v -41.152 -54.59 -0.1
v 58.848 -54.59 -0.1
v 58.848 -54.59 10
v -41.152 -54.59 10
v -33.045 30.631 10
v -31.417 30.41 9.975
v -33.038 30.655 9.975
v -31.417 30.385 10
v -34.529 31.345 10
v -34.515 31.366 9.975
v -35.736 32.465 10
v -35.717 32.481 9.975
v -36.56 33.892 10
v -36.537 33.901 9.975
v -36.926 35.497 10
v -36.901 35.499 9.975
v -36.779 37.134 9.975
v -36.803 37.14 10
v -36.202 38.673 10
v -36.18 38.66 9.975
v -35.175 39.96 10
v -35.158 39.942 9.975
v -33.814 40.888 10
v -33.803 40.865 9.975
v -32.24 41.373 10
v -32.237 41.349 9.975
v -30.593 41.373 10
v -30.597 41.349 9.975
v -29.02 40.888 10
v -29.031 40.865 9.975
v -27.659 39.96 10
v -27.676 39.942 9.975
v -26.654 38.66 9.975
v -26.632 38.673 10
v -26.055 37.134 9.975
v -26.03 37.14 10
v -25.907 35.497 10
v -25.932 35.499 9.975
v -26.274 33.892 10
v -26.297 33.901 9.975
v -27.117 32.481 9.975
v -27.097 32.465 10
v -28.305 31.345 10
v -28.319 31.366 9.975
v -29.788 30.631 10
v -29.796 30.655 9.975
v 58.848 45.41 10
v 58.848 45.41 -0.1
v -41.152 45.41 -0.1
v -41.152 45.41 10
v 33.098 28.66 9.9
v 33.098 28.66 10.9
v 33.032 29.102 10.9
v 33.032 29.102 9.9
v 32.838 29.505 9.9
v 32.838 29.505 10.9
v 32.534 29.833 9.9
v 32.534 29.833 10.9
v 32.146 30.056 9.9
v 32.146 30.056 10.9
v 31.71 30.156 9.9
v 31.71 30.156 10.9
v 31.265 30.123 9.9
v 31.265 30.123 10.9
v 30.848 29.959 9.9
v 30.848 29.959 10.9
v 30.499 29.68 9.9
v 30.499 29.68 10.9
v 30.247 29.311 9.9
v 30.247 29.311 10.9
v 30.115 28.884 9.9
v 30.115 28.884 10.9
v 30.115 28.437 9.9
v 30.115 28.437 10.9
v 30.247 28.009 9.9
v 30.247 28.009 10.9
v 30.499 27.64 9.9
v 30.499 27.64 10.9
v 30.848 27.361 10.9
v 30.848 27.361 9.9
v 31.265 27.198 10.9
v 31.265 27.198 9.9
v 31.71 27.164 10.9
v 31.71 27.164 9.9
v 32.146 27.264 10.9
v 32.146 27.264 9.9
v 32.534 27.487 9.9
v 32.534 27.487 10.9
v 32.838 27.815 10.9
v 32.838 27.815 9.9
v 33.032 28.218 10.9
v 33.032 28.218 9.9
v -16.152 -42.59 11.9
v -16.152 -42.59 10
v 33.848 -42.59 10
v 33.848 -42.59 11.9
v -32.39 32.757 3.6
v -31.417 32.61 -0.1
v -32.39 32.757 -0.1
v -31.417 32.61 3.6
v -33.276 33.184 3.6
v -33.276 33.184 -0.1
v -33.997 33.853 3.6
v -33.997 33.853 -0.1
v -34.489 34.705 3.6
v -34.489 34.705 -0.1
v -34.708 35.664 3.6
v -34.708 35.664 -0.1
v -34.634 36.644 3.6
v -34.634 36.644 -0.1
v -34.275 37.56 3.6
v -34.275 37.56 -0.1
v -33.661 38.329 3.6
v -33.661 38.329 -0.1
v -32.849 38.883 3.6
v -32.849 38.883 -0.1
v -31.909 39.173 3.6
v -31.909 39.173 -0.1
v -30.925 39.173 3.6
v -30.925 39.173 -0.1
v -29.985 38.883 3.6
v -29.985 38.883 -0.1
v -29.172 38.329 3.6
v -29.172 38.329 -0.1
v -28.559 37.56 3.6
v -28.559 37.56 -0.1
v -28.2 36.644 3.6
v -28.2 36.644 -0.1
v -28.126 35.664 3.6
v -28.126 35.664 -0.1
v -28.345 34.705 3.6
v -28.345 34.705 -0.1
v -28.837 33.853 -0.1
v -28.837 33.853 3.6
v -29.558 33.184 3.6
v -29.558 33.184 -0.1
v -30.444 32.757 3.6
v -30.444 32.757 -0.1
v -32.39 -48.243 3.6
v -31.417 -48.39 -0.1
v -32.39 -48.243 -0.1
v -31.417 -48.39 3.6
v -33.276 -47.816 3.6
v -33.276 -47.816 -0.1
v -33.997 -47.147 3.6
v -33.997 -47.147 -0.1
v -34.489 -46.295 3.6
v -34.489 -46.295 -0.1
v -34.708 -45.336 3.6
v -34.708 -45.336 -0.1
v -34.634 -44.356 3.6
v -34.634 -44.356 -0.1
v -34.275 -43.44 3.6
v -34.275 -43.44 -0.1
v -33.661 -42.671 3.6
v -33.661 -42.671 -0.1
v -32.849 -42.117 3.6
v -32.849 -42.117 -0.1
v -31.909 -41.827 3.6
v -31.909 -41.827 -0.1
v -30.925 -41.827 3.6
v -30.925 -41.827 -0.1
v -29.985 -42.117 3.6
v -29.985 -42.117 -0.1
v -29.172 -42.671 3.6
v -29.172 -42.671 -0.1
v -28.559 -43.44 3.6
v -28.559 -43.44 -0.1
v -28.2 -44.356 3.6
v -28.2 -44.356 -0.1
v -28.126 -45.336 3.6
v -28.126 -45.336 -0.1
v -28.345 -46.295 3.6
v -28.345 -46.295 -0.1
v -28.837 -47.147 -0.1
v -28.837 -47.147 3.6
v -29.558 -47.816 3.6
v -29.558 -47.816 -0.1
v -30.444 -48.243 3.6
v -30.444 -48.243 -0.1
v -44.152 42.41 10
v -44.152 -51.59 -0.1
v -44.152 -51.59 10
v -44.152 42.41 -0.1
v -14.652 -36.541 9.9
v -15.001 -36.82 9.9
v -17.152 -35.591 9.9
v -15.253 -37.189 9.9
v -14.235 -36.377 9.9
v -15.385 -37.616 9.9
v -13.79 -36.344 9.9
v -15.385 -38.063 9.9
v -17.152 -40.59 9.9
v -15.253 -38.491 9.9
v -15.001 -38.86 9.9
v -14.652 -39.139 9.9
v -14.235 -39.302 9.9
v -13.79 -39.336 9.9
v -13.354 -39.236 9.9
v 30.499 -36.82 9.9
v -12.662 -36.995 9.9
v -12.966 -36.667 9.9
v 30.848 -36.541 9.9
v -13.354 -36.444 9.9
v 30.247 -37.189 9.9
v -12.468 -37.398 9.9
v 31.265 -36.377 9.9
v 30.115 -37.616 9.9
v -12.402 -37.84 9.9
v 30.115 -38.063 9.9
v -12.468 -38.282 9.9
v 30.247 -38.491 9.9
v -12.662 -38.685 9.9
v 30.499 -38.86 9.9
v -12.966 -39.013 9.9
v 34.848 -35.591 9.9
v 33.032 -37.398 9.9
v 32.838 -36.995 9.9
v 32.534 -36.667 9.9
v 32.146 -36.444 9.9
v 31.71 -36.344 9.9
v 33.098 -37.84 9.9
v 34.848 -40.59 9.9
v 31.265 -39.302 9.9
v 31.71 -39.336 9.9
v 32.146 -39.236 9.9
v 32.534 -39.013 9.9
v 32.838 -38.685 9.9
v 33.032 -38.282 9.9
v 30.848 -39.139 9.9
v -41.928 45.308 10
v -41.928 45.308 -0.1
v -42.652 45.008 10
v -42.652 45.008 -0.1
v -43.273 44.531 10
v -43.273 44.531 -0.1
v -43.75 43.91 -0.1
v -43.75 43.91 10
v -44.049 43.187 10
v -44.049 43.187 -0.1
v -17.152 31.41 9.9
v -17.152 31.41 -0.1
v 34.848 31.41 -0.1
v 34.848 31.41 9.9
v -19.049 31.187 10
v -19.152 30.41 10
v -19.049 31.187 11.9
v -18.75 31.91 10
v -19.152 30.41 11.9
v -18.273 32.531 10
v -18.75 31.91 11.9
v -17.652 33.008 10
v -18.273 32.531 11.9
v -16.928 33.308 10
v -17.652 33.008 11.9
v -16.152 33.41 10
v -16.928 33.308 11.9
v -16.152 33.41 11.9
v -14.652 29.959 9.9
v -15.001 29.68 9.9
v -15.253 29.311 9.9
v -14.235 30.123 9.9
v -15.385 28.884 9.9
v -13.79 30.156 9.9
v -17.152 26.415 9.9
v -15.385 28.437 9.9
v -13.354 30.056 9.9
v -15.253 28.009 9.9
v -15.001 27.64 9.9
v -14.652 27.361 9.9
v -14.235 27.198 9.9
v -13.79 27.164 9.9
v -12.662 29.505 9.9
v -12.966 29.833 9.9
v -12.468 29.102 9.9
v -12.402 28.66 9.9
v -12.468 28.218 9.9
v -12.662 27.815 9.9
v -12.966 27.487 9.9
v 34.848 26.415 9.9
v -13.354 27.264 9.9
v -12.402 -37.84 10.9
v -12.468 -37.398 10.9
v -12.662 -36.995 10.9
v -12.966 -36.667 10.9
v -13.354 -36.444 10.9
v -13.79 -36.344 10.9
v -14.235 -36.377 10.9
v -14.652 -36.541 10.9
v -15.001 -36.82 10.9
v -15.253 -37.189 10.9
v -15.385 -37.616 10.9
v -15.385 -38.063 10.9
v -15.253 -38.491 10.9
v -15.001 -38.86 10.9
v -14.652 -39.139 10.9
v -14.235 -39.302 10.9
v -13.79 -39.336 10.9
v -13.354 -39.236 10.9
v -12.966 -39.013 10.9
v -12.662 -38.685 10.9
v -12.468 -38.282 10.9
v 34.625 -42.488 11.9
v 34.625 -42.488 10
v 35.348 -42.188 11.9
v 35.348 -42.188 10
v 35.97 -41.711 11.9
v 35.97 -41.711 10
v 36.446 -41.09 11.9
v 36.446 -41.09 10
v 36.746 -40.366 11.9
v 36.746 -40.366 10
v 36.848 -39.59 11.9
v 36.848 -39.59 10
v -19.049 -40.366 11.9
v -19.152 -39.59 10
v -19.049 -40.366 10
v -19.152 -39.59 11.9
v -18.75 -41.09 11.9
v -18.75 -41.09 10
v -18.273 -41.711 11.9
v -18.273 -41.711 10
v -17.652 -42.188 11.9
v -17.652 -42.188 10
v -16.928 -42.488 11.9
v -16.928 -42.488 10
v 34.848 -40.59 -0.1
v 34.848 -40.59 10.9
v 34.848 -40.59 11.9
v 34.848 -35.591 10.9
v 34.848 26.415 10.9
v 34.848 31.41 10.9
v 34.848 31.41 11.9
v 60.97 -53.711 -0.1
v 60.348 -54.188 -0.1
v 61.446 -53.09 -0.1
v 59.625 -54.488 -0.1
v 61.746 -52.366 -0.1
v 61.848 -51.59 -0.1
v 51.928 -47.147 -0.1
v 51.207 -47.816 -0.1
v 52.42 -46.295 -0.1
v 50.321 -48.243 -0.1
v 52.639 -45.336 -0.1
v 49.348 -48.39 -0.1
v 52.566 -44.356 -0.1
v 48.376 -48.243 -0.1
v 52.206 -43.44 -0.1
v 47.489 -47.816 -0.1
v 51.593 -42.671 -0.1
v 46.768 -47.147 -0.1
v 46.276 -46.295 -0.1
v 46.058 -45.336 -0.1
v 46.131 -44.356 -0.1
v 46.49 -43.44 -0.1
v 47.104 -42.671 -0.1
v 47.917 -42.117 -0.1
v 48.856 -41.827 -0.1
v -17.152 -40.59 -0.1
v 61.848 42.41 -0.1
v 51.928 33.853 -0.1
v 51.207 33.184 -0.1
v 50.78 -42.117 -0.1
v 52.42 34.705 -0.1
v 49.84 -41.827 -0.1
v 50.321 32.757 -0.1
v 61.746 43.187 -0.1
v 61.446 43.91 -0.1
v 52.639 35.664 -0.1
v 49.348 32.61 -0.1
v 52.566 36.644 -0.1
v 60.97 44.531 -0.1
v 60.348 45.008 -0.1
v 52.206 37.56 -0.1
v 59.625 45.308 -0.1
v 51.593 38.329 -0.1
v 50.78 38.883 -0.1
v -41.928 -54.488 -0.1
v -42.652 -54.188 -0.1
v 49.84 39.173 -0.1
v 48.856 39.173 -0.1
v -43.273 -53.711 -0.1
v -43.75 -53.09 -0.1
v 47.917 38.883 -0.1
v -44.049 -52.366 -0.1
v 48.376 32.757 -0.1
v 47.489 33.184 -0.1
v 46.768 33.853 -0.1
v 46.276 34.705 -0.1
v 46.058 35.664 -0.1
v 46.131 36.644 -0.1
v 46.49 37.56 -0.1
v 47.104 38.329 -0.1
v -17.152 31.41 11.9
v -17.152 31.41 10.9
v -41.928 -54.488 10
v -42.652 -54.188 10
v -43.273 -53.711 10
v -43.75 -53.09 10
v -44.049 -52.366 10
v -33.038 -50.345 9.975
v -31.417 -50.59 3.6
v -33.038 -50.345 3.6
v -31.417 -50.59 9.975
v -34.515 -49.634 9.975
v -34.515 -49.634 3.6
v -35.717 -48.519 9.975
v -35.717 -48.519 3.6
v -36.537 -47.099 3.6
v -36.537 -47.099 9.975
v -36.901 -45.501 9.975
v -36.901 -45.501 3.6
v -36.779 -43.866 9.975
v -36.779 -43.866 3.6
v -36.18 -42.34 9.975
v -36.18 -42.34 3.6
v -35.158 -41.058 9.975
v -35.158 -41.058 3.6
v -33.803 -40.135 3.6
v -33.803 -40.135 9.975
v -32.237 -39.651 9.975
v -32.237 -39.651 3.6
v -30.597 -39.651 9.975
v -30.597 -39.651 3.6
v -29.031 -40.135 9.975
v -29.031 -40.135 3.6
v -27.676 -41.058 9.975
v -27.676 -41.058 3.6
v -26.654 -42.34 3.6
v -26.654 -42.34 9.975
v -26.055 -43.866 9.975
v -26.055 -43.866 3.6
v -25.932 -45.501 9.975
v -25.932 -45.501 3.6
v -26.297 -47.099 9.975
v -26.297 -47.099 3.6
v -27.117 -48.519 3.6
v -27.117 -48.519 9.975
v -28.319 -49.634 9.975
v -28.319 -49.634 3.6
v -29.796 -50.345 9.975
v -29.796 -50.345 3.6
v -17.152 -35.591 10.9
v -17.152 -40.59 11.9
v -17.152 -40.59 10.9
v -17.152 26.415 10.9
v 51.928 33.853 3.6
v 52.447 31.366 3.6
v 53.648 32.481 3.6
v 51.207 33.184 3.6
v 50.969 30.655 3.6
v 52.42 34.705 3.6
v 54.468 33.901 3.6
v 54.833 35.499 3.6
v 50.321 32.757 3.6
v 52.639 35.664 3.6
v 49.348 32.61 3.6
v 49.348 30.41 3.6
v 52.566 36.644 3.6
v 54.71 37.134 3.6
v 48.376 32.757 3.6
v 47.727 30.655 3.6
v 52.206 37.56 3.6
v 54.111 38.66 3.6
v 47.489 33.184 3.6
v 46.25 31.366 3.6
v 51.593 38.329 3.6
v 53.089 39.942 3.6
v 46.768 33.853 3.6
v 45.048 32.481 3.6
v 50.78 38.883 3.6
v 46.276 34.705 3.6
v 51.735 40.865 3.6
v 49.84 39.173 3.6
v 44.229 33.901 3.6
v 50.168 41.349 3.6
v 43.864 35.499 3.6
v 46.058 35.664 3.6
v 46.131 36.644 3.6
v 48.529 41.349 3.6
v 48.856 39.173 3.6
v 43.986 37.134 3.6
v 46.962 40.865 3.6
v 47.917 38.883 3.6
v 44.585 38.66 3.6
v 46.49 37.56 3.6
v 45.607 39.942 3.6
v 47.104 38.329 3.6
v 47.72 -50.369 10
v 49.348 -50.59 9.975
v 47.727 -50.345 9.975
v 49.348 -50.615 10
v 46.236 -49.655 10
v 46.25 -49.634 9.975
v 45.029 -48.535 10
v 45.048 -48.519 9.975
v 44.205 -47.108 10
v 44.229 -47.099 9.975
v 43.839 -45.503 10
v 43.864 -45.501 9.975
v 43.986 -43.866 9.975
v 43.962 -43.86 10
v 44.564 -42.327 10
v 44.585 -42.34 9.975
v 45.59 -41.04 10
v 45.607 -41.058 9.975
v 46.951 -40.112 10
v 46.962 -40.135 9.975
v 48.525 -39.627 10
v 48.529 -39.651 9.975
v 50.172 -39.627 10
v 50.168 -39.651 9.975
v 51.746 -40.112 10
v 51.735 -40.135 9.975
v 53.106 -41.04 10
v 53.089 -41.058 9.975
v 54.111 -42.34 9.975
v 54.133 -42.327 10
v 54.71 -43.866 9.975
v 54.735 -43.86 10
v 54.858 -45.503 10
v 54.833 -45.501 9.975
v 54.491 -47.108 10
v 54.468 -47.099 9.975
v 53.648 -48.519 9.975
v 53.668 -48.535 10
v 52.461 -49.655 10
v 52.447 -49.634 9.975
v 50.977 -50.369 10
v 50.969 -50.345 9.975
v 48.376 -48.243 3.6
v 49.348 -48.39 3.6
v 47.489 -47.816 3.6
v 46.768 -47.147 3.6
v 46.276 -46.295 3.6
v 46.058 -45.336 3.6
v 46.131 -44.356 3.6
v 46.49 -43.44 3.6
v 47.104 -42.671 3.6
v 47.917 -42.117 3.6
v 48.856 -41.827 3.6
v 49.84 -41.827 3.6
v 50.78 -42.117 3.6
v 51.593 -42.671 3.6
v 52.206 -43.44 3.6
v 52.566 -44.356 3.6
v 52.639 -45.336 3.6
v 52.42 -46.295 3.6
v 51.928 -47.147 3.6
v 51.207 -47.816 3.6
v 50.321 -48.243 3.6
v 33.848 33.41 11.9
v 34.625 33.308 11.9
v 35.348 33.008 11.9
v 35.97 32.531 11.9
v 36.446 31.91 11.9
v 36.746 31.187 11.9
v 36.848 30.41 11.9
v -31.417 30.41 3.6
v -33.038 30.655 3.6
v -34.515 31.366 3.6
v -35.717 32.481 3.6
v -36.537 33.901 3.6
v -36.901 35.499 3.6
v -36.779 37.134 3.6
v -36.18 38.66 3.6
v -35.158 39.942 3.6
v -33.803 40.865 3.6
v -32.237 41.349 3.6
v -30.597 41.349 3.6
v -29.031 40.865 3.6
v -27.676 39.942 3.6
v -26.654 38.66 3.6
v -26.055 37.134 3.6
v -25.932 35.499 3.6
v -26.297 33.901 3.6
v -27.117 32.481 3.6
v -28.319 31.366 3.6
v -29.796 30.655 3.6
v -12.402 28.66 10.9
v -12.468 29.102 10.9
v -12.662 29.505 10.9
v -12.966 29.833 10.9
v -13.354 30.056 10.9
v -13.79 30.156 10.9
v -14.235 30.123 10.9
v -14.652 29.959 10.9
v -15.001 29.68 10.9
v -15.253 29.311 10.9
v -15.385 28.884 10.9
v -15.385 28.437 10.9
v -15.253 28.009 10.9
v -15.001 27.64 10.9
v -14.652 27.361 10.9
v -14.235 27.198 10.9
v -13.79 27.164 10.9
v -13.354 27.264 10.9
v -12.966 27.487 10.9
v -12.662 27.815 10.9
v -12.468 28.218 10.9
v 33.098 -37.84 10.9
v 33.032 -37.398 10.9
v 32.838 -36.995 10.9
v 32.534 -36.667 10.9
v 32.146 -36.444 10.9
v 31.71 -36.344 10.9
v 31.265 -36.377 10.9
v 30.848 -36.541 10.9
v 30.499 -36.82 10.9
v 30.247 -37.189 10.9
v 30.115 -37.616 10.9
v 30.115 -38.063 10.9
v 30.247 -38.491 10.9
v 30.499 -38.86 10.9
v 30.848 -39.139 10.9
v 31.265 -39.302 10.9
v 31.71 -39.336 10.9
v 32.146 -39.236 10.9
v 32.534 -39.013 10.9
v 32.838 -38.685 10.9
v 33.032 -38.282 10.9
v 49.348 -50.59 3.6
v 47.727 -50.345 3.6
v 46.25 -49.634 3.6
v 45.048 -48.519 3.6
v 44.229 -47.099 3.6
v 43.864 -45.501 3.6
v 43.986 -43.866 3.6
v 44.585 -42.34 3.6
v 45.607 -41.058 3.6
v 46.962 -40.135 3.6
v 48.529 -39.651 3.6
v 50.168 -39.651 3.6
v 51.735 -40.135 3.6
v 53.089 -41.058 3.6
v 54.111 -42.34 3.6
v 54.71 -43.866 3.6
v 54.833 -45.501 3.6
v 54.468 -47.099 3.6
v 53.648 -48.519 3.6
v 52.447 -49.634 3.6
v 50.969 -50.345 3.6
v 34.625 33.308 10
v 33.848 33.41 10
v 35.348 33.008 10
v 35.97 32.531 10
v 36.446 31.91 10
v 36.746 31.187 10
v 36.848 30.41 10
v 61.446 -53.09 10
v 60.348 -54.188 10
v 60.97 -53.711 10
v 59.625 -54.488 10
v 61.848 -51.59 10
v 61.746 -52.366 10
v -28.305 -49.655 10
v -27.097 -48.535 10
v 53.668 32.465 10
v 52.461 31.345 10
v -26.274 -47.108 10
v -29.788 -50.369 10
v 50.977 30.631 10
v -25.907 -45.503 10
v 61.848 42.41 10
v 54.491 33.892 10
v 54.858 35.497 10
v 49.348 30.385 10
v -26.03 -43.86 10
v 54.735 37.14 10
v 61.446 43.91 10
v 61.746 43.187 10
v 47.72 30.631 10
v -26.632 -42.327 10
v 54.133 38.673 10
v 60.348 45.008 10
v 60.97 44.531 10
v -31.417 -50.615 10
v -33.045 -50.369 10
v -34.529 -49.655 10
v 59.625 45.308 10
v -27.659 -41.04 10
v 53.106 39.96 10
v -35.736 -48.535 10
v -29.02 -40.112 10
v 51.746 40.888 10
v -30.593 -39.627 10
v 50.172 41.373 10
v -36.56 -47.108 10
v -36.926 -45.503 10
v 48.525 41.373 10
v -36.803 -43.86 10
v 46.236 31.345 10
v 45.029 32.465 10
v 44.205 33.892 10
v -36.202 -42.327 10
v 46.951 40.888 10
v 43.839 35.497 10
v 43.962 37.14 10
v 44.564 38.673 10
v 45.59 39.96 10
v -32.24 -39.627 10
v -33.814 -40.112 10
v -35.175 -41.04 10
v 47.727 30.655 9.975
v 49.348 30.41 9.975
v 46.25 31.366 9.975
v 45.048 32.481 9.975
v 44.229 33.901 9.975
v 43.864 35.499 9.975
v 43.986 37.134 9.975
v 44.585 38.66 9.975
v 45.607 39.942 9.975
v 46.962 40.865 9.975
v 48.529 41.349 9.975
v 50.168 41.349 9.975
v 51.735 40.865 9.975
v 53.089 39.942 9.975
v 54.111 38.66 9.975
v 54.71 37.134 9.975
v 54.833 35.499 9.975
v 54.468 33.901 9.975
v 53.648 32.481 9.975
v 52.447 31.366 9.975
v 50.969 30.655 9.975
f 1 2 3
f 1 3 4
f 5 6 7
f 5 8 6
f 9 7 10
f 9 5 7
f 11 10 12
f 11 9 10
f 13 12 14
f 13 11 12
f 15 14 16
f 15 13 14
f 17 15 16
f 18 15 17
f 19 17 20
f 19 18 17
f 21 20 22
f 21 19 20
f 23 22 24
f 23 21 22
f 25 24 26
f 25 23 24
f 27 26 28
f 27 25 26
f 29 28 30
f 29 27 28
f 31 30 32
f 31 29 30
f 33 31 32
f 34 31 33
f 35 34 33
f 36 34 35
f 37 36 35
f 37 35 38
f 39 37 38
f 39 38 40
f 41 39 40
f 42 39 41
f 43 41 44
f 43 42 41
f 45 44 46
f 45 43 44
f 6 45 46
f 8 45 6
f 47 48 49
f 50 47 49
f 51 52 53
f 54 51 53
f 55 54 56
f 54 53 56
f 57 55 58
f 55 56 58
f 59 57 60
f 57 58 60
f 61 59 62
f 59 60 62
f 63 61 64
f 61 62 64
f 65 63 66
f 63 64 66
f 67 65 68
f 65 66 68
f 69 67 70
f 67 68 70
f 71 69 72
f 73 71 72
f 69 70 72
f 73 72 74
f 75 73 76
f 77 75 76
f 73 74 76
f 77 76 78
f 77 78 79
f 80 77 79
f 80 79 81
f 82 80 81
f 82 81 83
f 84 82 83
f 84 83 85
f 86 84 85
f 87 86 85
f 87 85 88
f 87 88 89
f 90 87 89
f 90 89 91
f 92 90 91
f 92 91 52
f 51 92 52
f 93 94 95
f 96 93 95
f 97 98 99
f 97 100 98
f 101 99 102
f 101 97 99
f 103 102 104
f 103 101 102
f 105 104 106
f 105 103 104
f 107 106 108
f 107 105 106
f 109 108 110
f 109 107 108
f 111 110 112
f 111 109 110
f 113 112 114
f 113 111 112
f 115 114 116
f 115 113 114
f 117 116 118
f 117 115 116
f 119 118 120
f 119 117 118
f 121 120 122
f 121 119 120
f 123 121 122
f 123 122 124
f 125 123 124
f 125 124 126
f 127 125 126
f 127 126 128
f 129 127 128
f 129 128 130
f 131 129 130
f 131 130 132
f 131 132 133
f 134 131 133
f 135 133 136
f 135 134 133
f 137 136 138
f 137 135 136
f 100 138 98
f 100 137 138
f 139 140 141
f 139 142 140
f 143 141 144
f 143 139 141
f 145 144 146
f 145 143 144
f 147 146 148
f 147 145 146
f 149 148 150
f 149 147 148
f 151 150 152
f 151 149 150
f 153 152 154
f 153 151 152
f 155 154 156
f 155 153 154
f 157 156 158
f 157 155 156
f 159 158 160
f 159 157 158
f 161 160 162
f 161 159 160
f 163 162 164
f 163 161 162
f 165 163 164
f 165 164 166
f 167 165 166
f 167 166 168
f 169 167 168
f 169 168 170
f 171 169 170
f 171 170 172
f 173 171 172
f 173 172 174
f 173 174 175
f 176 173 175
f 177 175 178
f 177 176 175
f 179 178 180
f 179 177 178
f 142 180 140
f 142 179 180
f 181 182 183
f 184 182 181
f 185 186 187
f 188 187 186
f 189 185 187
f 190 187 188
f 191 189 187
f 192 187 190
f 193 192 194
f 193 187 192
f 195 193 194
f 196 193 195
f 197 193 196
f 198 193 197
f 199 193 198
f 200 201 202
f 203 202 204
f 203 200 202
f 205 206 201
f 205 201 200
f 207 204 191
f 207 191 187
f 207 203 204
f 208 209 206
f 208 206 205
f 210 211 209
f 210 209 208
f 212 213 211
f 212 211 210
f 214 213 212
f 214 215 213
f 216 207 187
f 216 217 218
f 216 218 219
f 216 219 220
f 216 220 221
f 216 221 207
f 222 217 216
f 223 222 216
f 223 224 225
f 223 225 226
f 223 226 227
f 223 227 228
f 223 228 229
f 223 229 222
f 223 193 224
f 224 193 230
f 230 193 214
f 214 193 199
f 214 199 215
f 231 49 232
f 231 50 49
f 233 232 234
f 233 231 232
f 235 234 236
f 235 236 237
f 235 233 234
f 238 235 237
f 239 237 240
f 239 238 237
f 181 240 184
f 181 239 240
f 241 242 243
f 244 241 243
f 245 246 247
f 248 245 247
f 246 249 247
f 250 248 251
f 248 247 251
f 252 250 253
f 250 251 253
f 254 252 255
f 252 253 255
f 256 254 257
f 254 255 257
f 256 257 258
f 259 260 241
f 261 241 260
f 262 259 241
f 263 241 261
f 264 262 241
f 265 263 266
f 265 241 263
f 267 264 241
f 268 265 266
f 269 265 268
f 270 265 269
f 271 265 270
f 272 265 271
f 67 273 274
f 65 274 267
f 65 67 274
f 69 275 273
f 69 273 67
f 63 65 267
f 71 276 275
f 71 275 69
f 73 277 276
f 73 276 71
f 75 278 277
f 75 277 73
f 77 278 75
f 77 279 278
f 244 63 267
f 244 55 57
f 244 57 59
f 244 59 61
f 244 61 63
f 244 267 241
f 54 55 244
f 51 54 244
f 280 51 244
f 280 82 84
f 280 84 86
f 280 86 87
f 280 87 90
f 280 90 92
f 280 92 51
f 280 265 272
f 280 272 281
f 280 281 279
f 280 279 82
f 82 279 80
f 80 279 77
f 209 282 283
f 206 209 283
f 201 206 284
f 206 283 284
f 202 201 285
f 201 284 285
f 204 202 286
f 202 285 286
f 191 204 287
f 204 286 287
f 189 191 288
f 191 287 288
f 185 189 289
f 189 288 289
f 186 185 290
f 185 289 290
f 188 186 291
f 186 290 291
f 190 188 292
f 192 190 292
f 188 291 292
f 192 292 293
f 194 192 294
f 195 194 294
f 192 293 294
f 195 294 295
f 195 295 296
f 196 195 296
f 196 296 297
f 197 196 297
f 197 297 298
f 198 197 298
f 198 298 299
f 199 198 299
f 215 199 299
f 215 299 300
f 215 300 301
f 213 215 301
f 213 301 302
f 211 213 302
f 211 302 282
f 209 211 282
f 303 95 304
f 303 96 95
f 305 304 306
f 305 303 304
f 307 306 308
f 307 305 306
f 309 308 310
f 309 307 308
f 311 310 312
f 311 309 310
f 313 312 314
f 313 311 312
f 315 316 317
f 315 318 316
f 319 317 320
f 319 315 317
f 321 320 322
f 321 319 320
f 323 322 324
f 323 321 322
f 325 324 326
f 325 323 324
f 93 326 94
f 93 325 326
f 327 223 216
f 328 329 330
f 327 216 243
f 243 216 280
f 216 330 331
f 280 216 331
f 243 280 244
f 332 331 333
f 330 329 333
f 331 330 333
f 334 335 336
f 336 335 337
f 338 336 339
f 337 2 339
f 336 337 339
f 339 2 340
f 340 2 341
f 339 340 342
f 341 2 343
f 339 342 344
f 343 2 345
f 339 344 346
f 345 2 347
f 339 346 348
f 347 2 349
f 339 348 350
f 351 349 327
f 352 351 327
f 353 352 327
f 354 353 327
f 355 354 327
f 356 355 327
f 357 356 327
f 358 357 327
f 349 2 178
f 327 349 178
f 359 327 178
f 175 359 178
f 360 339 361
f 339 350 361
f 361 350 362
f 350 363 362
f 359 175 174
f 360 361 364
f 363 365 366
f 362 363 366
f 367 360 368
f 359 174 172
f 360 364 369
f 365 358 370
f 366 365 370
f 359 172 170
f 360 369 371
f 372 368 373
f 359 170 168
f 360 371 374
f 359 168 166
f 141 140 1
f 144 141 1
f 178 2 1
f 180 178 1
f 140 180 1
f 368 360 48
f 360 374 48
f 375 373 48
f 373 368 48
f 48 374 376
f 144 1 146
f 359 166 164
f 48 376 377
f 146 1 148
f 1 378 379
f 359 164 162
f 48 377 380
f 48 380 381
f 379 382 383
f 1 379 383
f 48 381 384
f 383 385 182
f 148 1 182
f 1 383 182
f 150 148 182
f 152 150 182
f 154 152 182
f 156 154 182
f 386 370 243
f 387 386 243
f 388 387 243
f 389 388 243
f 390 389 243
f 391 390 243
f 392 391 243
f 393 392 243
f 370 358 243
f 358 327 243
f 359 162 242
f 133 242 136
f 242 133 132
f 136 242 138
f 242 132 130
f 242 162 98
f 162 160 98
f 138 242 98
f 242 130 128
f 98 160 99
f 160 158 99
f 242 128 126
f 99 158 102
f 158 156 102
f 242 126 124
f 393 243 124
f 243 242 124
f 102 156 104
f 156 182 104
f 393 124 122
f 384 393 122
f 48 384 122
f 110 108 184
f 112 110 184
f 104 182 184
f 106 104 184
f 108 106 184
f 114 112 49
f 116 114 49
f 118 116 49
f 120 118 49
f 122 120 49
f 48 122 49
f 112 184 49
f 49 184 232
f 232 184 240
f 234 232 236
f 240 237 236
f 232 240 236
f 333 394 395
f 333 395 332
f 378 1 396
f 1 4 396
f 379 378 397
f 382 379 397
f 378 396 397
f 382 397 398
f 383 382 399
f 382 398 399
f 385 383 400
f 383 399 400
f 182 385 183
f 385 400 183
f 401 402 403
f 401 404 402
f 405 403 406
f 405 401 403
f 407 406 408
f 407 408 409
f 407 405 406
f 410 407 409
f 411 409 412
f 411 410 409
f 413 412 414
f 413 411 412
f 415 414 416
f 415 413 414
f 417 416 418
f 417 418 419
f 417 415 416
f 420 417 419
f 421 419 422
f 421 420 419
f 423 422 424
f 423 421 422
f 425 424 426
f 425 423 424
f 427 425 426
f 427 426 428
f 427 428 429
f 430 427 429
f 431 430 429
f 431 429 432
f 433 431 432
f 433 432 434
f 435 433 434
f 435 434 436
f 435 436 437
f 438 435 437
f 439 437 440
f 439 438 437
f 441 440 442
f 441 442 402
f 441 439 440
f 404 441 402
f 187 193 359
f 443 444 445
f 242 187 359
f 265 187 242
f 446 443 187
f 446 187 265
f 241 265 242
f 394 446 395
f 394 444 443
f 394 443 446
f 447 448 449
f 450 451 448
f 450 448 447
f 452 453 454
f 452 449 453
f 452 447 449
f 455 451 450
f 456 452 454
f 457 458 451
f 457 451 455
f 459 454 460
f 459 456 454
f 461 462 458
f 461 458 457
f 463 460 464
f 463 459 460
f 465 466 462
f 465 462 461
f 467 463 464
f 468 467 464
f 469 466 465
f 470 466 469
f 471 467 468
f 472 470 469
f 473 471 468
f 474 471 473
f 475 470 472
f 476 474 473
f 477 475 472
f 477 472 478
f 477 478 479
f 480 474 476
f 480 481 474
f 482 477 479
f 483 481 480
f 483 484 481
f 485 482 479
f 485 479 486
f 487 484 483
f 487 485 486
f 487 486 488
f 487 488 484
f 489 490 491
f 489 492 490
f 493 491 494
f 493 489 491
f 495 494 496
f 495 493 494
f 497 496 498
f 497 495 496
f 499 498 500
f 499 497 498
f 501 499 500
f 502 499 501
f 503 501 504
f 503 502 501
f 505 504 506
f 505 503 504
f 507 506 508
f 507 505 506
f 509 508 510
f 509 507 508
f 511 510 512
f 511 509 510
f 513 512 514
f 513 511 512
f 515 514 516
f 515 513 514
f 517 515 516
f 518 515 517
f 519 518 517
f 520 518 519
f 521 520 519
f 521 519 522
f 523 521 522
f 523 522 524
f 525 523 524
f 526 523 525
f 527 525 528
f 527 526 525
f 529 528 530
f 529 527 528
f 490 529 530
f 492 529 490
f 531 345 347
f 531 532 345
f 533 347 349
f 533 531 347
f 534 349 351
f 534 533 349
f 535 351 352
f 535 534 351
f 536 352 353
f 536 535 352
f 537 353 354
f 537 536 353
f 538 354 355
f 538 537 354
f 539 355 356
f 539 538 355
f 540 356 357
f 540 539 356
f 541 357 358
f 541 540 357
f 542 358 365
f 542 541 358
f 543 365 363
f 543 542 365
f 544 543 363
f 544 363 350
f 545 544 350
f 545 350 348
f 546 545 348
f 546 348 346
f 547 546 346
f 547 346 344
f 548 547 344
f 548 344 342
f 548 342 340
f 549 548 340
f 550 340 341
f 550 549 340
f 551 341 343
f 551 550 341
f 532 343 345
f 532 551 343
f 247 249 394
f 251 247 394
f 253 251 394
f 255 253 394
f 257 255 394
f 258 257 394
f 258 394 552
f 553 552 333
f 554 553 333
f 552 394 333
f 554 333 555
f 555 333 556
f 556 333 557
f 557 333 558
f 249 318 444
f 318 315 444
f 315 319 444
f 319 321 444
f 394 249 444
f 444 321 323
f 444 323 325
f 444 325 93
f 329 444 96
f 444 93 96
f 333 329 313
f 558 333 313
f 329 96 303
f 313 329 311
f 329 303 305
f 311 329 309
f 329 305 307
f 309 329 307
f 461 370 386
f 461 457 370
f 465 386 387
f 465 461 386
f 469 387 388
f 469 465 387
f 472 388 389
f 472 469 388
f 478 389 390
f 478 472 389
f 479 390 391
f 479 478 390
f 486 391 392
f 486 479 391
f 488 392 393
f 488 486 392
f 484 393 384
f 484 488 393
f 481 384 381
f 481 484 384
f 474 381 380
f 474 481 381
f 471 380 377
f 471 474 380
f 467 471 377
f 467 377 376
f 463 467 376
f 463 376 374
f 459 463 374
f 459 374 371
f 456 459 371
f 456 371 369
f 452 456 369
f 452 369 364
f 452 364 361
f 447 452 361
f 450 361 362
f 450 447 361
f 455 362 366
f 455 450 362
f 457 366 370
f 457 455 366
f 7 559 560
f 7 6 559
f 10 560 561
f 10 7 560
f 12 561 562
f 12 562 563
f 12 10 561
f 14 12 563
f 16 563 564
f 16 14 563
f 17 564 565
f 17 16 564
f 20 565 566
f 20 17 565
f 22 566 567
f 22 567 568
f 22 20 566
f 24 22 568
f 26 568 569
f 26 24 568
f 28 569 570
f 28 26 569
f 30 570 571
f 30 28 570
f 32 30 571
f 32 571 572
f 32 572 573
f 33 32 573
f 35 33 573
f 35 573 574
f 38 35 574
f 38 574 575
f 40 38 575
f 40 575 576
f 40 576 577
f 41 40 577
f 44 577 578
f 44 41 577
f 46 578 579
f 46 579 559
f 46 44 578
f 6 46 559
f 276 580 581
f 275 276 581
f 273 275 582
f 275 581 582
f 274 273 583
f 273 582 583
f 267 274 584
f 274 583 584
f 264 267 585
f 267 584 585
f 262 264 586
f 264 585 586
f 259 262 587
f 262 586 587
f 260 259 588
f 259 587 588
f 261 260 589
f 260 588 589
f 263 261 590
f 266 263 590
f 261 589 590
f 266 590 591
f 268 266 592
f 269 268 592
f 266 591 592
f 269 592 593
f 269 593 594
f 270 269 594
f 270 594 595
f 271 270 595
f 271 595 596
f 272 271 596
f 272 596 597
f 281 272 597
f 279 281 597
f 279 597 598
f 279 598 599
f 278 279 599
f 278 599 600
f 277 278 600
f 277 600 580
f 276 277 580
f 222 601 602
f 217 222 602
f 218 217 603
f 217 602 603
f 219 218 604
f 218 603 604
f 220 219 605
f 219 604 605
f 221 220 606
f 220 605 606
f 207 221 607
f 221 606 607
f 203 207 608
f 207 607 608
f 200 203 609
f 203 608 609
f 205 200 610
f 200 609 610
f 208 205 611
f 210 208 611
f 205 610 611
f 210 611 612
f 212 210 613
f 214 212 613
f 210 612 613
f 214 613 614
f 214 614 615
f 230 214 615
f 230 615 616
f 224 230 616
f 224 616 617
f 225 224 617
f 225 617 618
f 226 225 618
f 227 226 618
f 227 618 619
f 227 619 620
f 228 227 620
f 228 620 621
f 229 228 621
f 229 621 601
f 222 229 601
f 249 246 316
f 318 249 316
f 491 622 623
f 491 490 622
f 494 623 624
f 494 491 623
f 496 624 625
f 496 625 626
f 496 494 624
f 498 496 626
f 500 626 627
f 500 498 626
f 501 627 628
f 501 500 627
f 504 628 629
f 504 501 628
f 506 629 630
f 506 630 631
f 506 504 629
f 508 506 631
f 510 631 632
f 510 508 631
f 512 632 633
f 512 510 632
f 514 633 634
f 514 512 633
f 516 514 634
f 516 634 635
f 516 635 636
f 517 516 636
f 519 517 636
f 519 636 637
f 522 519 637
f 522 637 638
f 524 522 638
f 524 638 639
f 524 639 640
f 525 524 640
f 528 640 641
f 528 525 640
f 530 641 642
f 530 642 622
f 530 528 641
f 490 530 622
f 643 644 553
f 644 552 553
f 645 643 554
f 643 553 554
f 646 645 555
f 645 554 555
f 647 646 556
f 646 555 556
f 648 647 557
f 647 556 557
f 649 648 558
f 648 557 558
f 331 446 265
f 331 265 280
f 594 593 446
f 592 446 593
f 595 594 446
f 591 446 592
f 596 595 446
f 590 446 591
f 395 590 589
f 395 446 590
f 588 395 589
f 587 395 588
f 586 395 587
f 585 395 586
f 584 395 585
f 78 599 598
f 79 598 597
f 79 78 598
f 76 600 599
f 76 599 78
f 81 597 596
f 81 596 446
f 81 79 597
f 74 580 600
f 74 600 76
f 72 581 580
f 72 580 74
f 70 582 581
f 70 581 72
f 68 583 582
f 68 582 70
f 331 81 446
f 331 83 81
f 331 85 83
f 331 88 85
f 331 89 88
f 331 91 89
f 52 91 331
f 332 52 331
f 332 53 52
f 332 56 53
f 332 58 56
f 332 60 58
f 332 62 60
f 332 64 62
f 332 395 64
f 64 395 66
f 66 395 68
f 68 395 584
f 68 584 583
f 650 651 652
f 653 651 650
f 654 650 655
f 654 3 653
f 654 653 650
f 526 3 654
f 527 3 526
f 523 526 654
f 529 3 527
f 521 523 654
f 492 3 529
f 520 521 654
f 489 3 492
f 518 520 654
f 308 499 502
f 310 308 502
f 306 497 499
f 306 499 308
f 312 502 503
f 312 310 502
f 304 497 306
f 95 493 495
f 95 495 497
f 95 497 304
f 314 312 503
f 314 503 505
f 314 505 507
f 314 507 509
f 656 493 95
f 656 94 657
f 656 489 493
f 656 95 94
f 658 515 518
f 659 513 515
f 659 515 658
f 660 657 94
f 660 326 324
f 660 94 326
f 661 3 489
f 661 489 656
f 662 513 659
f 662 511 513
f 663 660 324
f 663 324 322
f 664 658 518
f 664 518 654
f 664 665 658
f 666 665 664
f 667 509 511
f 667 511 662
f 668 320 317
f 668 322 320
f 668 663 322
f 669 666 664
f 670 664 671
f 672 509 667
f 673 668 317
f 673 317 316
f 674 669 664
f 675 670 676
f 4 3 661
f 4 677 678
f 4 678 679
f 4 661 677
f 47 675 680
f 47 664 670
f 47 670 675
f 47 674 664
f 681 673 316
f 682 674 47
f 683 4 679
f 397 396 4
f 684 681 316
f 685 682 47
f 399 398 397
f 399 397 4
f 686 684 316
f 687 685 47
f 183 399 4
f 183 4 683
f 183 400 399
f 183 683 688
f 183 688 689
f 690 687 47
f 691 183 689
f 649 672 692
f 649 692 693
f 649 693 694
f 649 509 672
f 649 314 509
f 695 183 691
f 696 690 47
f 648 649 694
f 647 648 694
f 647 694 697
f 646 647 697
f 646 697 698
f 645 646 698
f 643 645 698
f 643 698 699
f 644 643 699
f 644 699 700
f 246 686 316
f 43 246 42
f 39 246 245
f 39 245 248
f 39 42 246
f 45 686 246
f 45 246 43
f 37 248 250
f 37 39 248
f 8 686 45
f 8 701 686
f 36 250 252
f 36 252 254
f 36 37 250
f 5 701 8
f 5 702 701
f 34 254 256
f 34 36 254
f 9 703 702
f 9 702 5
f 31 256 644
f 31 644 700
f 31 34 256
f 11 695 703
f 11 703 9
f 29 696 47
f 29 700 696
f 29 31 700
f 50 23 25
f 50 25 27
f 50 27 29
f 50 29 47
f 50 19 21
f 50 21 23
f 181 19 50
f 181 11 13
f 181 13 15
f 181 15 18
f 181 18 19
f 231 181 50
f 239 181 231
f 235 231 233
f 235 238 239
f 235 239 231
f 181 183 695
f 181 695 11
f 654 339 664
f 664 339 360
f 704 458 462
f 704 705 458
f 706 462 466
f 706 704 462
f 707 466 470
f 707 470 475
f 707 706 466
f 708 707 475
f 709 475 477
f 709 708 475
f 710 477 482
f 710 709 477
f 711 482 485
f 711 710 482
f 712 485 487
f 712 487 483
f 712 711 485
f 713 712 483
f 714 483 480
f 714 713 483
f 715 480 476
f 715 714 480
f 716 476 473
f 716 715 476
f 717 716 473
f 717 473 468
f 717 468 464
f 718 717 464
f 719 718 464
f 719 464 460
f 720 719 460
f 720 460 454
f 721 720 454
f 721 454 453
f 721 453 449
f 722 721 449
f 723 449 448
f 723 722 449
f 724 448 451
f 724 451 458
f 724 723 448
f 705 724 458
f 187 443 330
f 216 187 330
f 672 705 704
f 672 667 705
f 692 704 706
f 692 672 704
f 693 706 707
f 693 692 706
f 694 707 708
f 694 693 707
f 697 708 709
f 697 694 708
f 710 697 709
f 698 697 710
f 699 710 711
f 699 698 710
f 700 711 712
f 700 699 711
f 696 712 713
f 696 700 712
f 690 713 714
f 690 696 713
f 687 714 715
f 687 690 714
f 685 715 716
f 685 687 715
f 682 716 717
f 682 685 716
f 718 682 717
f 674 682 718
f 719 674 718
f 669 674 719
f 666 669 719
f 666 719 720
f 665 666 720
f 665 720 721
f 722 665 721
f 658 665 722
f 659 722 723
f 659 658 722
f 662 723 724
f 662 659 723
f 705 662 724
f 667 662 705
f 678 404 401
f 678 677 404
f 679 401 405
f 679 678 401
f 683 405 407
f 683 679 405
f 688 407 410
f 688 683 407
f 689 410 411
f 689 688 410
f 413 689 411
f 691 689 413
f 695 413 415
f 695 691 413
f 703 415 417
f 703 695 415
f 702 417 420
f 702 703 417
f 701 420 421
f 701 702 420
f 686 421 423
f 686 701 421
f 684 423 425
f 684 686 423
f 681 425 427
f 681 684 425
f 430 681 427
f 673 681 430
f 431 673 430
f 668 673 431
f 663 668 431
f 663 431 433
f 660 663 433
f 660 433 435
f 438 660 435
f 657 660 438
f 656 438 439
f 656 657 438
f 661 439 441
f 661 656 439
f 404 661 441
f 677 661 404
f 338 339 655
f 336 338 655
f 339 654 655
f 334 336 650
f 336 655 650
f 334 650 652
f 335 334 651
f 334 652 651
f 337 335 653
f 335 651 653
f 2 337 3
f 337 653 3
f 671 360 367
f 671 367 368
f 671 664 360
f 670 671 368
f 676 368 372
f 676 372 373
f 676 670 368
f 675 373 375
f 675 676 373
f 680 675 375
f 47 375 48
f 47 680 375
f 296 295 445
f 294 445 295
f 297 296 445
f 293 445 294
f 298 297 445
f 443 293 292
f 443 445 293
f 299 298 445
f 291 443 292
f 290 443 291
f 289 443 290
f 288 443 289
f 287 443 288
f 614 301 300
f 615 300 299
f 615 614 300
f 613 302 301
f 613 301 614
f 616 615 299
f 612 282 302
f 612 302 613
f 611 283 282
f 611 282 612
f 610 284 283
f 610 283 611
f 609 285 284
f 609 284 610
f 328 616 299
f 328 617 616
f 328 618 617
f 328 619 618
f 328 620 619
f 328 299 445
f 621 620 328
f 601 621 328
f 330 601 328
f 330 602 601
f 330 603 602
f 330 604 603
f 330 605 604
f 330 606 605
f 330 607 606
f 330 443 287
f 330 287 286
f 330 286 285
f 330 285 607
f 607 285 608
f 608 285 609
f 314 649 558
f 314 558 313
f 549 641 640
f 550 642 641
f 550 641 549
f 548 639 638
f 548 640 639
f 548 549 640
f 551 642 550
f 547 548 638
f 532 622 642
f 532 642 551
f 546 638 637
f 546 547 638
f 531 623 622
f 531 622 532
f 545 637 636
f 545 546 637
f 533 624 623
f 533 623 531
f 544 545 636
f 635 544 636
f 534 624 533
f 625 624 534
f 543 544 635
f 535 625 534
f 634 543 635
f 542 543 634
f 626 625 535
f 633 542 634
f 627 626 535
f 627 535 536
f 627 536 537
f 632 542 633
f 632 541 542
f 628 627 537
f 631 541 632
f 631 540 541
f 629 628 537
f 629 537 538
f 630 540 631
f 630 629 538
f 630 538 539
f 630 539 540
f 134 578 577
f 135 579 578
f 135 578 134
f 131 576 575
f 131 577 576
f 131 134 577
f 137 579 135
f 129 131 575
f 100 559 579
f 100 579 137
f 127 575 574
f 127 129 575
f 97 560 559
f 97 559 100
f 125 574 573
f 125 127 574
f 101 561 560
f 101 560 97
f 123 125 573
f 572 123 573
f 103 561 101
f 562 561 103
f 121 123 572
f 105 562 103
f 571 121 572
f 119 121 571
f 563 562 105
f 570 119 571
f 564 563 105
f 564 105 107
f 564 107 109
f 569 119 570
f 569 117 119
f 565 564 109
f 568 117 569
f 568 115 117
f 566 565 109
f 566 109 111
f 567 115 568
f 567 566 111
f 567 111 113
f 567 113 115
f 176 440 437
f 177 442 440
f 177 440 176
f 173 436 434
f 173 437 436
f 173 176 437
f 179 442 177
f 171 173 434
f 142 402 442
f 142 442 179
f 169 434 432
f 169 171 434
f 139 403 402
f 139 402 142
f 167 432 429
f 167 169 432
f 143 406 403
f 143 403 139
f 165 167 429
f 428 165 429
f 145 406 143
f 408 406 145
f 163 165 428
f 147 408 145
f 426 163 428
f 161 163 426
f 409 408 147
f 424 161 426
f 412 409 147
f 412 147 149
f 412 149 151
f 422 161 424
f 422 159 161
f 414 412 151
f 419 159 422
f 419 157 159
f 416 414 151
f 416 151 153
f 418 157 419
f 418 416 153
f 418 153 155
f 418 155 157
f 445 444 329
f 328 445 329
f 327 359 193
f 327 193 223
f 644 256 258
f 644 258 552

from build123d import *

# Parameters (mm, degrees)
BOSS_EXTRUDE3_DEPTH                          = 10
BOSS_EXTRUDE3_DEPTH_BACK                     = 0.1
SKETCH1_W                                    = 100
SKETCH1_H                                    = 106
SKETCH1_W_2                                  = 76
SKETCH1_H_2                                  = 56
CBORE_FOR_M6_HEX_SOCKET_HEAD_CAP_SCR_2_COUNT = 2
CBORE_FOR_M6_HEX_SOCKET_HEAD_CAP_SCR_2_PITCH = 81
CBORE_FOR_M6_HEX_SOCKET_HEAD_CAP_SCR_3_COUNT = 2
CBORE_FOR_M6_HEX_SOCKET_HEAD_CAP_SCR_3_PITCH = 114.385386776
CBORE_FOR_M6_HEX_SOCKET_HEAD_CAP_SCR_4_COUNT = 2
CBORE_FOR_M6_HEX_SOCKET_HEAD_CAP_SCR_4_PITCH = 80.765194904
SKETCH7_W                                    = 56
SKETCH7_H                                    = 76
BOSS_EXTRUDE4_DEPTH                          = 12
SKETCH8_W                                    = 52
SKETCH8_H                                    = 72
BOSS_EXTRUDE5_DEPTH                          = 1
SKETCH9_W                                    = 52
SKETCH9_H                                    = 72
CUT_EXTRUDE1_DEPTH                           = 1
SKETCH10_W                                   = 52
SKETCH10_H                                   = 62.005454301
CUT_EXTRUDE2_DEPTH                           = 11
SKETCH11_W                                   = 52
SKETCH11_H                                   = 4.999168043
SKETCH11_H_2                                 = 4.995377656
CUT_EXTRUDE3_DEPTH                           = 10
SKETCH12_R                                   = 1.5
CUT_EXTRUDE4_DEPTH                           = 2
SKETCH12_3_R                                 = 1.5
CUT_EXTRUDE5_DEPTH                           = 2
SKETCH14_R                                   = 1.5
CUT_EXTRUDE6_DEPTH                           = 2
SKETCH15_R                                   = 1.5
CUT_EXTRUDE7_DEPTH                           = 2
FILLET2_R                                    = 3


with BuildPart() as part:
    # Sketch1 → Boss-Extrude3 (new, two sides: drawn at the far end of the back side and taken through both)
    with BuildSketch(Plane(origin=(0, 0, 0), x_dir=(0, 1, 0), z_dir=(0, 0, 1)).offset(-BOSS_EXTRUDE3_DEPTH_BACK)):
        with Locations((-4.589836902, -8.848323211)):
            Rectangle(SKETCH1_W, SKETCH1_H)
        with Locations((-4.589836902, -8.848323211)):
            Rectangle(SKETCH1_W_2, SKETCH1_H_2, mode=Mode.SUBTRACT)
    extrude(amount=BOSS_EXTRUDE3_DEPTH + BOSS_EXTRUDE3_DEPTH_BACK)

    # Sketch6 → CBORE for M6 Hex Socket Head Cap Screw2 (revolve, cut)
    with BuildSketch(Plane(origin=(49.348323211, -45.089836902, 10), x_dir=(0, -1, 0), z_dir=(1, 0, 0))):
        Polygon((0, 0), (0, 10.1), (3.3, 10.1), (3.3, 6.4), (5.5, 6.4), (5.5, 0.025), (5.525, 0), align=None)
    cbore_for_m6_hex_socket_head_cap_screw2 = revolve(axis=Axis((49.348323211, -45.089836902, 16.35), (0, 0, -1)), mode=Mode.SUBTRACT)

    # CBORE for M6 Hex Socket Head Cap Scr 2: CBORE for M6 Hex Socket Head Cap Screw2 ×2
    with Locations(*[(0, i * CBORE_FOR_M6_HEX_SOCKET_HEAD_CAP_SCR_2_PITCH, 0) for i in range(1, CBORE_FOR_M6_HEX_SOCKET_HEAD_CAP_SCR_2_COUNT)]):
        add(cbore_for_m6_hex_socket_head_cap_screw2, mode=Mode.SUBTRACT)

    # CBORE for M6 Hex Socket Head Cap Scr 3: CBORE for M6 Hex Socket Head Cap Screw2 ×2
    with Locations(*[Vector(-0.7060796591298035, 0.7081324134391396, 0) * (i * CBORE_FOR_M6_HEX_SOCKET_HEAD_CAP_SCR_3_PITCH) for i in range(1, CBORE_FOR_M6_HEX_SOCKET_HEAD_CAP_SCR_3_COUNT)]):
        add(cbore_for_m6_hex_socket_head_cap_screw2, mode=Mode.SUBTRACT)

    # CBORE for M6 Hex Socket Head Cap Scr 4: CBORE for M6 Hex Socket Head Cap Screw2 ×2
    with Locations(*[(-i * CBORE_FOR_M6_HEX_SOCKET_HEAD_CAP_SCR_4_PITCH, 0, 0) for i in range(1, CBORE_FOR_M6_HEX_SOCKET_HEAD_CAP_SCR_4_COUNT)]):
        add(cbore_for_m6_hex_socket_head_cap_screw2, mode=Mode.SUBTRACT)

    # Sketch7 → Boss-Extrude4 (add)
    with BuildSketch(Plane(origin=(0, 0, -0.1), x_dir=(1, 0, 0), z_dir=(0, 0, -1))):
        with Locations((8.848323211, 4.589836902)):
            Rectangle(SKETCH7_W, SKETCH7_H)
    extrude(amount=-BOSS_EXTRUDE4_DEPTH)

    # Sketch8 → Boss-Extrude5 (add)
    with BuildSketch(Plane.XY.offset(11.9)):
        with Locations((8.848323211, -4.589836902)):
            Rectangle(SKETCH8_W, SKETCH8_H)
    extrude(amount=-BOSS_EXTRUDE5_DEPTH)

    # Sketch9 → Cut-Extrude1 (cut)
    with BuildSketch(Plane.XY.offset(11.9)):
        with Locations((8.848323211, -4.589836902)):
            Rectangle(SKETCH9_W, SKETCH9_H)
    extrude(amount=-CUT_EXTRUDE1_DEPTH, mode=Mode.SUBTRACT)

    # Sketch10 → Cut-Extrude2 (cut)
    with BuildSketch(Plane.XY.offset(10.9)):
        with Locations((8.848323211, -4.587941709)):
            Rectangle(SKETCH10_W, SKETCH10_H)
    extrude(amount=-CUT_EXTRUDE2_DEPTH, mode=Mode.SUBTRACT)

    # Sketch11 → Cut-Extrude3 (cut)
    with BuildSketch(Plane(origin=(0, 0, -0.1), x_dir=(1, 0, 0), z_dir=(0, 0, -1))):
        with Locations((8.848323211, 38.090252881)):
            Rectangle(SKETCH11_W, SKETCH11_H)
        with Locations((8.848323211, -28.91247427)):
            Rectangle(SKETCH11_W, SKETCH11_H_2)
    extrude(amount=-CUT_EXTRUDE3_DEPTH, mode=Mode.SUBTRACT)

    # Sketch12 → Cut-Extrude4 (cut)
    with BuildSketch(Plane.XY.offset(10.9)):
        with Locations((-13.901676789, 28.660163098)):
            Circle(SKETCH12_R)
    extrude(amount=-CUT_EXTRUDE4_DEPTH, mode=Mode.SUBTRACT)

    # Sketch12<3> → Cut-Extrude5 (cut)
    with BuildSketch(Plane.XY.offset(10.9)):
        with Locations((31.598323211, 28.660163098)):
            Circle(SKETCH12_3_R)
    extrude(amount=-CUT_EXTRUDE5_DEPTH, mode=Mode.SUBTRACT)

    # Sketch14 → Cut-Extrude6 (cut)
    with BuildSketch(Plane.XY.offset(10.9)):
        with Locations((-13.901676789, -37.839836902)):
            Circle(SKETCH14_R)
    extrude(amount=-CUT_EXTRUDE6_DEPTH, mode=Mode.SUBTRACT)

    # Sketch15 → Cut-Extrude7 (cut)
    with BuildSketch(Plane.XY.offset(10.9)):
        with Locations((31.598323211, -37.839836902)):
            Circle(SKETCH15_R)
    extrude(amount=-CUT_EXTRUDE7_DEPTH, mode=Mode.SUBTRACT)

    # Fillet2
    fillet2_edges = [part.edges().sort_by_distance(p)[0] for p in [
        (-44.151676789, 45.410163098, 4.95),
        (-19.151676789, 33.410163098, 10.95),
        (36.848323211, 33.410163098, 10.95),
        (61.848323211, 45.410163098, 4.95),
        (36.848323211, -42.589836902, 10.95),
        (61.848323211, -54.589836902, 4.95),
        (-44.151676789, -54.589836902, 4.95),
        (-19.151676789, -42.589836902, 10.95),
    ]]
    fillet(fillet2_edges, radius=FILLET2_R)


solid = part.part
